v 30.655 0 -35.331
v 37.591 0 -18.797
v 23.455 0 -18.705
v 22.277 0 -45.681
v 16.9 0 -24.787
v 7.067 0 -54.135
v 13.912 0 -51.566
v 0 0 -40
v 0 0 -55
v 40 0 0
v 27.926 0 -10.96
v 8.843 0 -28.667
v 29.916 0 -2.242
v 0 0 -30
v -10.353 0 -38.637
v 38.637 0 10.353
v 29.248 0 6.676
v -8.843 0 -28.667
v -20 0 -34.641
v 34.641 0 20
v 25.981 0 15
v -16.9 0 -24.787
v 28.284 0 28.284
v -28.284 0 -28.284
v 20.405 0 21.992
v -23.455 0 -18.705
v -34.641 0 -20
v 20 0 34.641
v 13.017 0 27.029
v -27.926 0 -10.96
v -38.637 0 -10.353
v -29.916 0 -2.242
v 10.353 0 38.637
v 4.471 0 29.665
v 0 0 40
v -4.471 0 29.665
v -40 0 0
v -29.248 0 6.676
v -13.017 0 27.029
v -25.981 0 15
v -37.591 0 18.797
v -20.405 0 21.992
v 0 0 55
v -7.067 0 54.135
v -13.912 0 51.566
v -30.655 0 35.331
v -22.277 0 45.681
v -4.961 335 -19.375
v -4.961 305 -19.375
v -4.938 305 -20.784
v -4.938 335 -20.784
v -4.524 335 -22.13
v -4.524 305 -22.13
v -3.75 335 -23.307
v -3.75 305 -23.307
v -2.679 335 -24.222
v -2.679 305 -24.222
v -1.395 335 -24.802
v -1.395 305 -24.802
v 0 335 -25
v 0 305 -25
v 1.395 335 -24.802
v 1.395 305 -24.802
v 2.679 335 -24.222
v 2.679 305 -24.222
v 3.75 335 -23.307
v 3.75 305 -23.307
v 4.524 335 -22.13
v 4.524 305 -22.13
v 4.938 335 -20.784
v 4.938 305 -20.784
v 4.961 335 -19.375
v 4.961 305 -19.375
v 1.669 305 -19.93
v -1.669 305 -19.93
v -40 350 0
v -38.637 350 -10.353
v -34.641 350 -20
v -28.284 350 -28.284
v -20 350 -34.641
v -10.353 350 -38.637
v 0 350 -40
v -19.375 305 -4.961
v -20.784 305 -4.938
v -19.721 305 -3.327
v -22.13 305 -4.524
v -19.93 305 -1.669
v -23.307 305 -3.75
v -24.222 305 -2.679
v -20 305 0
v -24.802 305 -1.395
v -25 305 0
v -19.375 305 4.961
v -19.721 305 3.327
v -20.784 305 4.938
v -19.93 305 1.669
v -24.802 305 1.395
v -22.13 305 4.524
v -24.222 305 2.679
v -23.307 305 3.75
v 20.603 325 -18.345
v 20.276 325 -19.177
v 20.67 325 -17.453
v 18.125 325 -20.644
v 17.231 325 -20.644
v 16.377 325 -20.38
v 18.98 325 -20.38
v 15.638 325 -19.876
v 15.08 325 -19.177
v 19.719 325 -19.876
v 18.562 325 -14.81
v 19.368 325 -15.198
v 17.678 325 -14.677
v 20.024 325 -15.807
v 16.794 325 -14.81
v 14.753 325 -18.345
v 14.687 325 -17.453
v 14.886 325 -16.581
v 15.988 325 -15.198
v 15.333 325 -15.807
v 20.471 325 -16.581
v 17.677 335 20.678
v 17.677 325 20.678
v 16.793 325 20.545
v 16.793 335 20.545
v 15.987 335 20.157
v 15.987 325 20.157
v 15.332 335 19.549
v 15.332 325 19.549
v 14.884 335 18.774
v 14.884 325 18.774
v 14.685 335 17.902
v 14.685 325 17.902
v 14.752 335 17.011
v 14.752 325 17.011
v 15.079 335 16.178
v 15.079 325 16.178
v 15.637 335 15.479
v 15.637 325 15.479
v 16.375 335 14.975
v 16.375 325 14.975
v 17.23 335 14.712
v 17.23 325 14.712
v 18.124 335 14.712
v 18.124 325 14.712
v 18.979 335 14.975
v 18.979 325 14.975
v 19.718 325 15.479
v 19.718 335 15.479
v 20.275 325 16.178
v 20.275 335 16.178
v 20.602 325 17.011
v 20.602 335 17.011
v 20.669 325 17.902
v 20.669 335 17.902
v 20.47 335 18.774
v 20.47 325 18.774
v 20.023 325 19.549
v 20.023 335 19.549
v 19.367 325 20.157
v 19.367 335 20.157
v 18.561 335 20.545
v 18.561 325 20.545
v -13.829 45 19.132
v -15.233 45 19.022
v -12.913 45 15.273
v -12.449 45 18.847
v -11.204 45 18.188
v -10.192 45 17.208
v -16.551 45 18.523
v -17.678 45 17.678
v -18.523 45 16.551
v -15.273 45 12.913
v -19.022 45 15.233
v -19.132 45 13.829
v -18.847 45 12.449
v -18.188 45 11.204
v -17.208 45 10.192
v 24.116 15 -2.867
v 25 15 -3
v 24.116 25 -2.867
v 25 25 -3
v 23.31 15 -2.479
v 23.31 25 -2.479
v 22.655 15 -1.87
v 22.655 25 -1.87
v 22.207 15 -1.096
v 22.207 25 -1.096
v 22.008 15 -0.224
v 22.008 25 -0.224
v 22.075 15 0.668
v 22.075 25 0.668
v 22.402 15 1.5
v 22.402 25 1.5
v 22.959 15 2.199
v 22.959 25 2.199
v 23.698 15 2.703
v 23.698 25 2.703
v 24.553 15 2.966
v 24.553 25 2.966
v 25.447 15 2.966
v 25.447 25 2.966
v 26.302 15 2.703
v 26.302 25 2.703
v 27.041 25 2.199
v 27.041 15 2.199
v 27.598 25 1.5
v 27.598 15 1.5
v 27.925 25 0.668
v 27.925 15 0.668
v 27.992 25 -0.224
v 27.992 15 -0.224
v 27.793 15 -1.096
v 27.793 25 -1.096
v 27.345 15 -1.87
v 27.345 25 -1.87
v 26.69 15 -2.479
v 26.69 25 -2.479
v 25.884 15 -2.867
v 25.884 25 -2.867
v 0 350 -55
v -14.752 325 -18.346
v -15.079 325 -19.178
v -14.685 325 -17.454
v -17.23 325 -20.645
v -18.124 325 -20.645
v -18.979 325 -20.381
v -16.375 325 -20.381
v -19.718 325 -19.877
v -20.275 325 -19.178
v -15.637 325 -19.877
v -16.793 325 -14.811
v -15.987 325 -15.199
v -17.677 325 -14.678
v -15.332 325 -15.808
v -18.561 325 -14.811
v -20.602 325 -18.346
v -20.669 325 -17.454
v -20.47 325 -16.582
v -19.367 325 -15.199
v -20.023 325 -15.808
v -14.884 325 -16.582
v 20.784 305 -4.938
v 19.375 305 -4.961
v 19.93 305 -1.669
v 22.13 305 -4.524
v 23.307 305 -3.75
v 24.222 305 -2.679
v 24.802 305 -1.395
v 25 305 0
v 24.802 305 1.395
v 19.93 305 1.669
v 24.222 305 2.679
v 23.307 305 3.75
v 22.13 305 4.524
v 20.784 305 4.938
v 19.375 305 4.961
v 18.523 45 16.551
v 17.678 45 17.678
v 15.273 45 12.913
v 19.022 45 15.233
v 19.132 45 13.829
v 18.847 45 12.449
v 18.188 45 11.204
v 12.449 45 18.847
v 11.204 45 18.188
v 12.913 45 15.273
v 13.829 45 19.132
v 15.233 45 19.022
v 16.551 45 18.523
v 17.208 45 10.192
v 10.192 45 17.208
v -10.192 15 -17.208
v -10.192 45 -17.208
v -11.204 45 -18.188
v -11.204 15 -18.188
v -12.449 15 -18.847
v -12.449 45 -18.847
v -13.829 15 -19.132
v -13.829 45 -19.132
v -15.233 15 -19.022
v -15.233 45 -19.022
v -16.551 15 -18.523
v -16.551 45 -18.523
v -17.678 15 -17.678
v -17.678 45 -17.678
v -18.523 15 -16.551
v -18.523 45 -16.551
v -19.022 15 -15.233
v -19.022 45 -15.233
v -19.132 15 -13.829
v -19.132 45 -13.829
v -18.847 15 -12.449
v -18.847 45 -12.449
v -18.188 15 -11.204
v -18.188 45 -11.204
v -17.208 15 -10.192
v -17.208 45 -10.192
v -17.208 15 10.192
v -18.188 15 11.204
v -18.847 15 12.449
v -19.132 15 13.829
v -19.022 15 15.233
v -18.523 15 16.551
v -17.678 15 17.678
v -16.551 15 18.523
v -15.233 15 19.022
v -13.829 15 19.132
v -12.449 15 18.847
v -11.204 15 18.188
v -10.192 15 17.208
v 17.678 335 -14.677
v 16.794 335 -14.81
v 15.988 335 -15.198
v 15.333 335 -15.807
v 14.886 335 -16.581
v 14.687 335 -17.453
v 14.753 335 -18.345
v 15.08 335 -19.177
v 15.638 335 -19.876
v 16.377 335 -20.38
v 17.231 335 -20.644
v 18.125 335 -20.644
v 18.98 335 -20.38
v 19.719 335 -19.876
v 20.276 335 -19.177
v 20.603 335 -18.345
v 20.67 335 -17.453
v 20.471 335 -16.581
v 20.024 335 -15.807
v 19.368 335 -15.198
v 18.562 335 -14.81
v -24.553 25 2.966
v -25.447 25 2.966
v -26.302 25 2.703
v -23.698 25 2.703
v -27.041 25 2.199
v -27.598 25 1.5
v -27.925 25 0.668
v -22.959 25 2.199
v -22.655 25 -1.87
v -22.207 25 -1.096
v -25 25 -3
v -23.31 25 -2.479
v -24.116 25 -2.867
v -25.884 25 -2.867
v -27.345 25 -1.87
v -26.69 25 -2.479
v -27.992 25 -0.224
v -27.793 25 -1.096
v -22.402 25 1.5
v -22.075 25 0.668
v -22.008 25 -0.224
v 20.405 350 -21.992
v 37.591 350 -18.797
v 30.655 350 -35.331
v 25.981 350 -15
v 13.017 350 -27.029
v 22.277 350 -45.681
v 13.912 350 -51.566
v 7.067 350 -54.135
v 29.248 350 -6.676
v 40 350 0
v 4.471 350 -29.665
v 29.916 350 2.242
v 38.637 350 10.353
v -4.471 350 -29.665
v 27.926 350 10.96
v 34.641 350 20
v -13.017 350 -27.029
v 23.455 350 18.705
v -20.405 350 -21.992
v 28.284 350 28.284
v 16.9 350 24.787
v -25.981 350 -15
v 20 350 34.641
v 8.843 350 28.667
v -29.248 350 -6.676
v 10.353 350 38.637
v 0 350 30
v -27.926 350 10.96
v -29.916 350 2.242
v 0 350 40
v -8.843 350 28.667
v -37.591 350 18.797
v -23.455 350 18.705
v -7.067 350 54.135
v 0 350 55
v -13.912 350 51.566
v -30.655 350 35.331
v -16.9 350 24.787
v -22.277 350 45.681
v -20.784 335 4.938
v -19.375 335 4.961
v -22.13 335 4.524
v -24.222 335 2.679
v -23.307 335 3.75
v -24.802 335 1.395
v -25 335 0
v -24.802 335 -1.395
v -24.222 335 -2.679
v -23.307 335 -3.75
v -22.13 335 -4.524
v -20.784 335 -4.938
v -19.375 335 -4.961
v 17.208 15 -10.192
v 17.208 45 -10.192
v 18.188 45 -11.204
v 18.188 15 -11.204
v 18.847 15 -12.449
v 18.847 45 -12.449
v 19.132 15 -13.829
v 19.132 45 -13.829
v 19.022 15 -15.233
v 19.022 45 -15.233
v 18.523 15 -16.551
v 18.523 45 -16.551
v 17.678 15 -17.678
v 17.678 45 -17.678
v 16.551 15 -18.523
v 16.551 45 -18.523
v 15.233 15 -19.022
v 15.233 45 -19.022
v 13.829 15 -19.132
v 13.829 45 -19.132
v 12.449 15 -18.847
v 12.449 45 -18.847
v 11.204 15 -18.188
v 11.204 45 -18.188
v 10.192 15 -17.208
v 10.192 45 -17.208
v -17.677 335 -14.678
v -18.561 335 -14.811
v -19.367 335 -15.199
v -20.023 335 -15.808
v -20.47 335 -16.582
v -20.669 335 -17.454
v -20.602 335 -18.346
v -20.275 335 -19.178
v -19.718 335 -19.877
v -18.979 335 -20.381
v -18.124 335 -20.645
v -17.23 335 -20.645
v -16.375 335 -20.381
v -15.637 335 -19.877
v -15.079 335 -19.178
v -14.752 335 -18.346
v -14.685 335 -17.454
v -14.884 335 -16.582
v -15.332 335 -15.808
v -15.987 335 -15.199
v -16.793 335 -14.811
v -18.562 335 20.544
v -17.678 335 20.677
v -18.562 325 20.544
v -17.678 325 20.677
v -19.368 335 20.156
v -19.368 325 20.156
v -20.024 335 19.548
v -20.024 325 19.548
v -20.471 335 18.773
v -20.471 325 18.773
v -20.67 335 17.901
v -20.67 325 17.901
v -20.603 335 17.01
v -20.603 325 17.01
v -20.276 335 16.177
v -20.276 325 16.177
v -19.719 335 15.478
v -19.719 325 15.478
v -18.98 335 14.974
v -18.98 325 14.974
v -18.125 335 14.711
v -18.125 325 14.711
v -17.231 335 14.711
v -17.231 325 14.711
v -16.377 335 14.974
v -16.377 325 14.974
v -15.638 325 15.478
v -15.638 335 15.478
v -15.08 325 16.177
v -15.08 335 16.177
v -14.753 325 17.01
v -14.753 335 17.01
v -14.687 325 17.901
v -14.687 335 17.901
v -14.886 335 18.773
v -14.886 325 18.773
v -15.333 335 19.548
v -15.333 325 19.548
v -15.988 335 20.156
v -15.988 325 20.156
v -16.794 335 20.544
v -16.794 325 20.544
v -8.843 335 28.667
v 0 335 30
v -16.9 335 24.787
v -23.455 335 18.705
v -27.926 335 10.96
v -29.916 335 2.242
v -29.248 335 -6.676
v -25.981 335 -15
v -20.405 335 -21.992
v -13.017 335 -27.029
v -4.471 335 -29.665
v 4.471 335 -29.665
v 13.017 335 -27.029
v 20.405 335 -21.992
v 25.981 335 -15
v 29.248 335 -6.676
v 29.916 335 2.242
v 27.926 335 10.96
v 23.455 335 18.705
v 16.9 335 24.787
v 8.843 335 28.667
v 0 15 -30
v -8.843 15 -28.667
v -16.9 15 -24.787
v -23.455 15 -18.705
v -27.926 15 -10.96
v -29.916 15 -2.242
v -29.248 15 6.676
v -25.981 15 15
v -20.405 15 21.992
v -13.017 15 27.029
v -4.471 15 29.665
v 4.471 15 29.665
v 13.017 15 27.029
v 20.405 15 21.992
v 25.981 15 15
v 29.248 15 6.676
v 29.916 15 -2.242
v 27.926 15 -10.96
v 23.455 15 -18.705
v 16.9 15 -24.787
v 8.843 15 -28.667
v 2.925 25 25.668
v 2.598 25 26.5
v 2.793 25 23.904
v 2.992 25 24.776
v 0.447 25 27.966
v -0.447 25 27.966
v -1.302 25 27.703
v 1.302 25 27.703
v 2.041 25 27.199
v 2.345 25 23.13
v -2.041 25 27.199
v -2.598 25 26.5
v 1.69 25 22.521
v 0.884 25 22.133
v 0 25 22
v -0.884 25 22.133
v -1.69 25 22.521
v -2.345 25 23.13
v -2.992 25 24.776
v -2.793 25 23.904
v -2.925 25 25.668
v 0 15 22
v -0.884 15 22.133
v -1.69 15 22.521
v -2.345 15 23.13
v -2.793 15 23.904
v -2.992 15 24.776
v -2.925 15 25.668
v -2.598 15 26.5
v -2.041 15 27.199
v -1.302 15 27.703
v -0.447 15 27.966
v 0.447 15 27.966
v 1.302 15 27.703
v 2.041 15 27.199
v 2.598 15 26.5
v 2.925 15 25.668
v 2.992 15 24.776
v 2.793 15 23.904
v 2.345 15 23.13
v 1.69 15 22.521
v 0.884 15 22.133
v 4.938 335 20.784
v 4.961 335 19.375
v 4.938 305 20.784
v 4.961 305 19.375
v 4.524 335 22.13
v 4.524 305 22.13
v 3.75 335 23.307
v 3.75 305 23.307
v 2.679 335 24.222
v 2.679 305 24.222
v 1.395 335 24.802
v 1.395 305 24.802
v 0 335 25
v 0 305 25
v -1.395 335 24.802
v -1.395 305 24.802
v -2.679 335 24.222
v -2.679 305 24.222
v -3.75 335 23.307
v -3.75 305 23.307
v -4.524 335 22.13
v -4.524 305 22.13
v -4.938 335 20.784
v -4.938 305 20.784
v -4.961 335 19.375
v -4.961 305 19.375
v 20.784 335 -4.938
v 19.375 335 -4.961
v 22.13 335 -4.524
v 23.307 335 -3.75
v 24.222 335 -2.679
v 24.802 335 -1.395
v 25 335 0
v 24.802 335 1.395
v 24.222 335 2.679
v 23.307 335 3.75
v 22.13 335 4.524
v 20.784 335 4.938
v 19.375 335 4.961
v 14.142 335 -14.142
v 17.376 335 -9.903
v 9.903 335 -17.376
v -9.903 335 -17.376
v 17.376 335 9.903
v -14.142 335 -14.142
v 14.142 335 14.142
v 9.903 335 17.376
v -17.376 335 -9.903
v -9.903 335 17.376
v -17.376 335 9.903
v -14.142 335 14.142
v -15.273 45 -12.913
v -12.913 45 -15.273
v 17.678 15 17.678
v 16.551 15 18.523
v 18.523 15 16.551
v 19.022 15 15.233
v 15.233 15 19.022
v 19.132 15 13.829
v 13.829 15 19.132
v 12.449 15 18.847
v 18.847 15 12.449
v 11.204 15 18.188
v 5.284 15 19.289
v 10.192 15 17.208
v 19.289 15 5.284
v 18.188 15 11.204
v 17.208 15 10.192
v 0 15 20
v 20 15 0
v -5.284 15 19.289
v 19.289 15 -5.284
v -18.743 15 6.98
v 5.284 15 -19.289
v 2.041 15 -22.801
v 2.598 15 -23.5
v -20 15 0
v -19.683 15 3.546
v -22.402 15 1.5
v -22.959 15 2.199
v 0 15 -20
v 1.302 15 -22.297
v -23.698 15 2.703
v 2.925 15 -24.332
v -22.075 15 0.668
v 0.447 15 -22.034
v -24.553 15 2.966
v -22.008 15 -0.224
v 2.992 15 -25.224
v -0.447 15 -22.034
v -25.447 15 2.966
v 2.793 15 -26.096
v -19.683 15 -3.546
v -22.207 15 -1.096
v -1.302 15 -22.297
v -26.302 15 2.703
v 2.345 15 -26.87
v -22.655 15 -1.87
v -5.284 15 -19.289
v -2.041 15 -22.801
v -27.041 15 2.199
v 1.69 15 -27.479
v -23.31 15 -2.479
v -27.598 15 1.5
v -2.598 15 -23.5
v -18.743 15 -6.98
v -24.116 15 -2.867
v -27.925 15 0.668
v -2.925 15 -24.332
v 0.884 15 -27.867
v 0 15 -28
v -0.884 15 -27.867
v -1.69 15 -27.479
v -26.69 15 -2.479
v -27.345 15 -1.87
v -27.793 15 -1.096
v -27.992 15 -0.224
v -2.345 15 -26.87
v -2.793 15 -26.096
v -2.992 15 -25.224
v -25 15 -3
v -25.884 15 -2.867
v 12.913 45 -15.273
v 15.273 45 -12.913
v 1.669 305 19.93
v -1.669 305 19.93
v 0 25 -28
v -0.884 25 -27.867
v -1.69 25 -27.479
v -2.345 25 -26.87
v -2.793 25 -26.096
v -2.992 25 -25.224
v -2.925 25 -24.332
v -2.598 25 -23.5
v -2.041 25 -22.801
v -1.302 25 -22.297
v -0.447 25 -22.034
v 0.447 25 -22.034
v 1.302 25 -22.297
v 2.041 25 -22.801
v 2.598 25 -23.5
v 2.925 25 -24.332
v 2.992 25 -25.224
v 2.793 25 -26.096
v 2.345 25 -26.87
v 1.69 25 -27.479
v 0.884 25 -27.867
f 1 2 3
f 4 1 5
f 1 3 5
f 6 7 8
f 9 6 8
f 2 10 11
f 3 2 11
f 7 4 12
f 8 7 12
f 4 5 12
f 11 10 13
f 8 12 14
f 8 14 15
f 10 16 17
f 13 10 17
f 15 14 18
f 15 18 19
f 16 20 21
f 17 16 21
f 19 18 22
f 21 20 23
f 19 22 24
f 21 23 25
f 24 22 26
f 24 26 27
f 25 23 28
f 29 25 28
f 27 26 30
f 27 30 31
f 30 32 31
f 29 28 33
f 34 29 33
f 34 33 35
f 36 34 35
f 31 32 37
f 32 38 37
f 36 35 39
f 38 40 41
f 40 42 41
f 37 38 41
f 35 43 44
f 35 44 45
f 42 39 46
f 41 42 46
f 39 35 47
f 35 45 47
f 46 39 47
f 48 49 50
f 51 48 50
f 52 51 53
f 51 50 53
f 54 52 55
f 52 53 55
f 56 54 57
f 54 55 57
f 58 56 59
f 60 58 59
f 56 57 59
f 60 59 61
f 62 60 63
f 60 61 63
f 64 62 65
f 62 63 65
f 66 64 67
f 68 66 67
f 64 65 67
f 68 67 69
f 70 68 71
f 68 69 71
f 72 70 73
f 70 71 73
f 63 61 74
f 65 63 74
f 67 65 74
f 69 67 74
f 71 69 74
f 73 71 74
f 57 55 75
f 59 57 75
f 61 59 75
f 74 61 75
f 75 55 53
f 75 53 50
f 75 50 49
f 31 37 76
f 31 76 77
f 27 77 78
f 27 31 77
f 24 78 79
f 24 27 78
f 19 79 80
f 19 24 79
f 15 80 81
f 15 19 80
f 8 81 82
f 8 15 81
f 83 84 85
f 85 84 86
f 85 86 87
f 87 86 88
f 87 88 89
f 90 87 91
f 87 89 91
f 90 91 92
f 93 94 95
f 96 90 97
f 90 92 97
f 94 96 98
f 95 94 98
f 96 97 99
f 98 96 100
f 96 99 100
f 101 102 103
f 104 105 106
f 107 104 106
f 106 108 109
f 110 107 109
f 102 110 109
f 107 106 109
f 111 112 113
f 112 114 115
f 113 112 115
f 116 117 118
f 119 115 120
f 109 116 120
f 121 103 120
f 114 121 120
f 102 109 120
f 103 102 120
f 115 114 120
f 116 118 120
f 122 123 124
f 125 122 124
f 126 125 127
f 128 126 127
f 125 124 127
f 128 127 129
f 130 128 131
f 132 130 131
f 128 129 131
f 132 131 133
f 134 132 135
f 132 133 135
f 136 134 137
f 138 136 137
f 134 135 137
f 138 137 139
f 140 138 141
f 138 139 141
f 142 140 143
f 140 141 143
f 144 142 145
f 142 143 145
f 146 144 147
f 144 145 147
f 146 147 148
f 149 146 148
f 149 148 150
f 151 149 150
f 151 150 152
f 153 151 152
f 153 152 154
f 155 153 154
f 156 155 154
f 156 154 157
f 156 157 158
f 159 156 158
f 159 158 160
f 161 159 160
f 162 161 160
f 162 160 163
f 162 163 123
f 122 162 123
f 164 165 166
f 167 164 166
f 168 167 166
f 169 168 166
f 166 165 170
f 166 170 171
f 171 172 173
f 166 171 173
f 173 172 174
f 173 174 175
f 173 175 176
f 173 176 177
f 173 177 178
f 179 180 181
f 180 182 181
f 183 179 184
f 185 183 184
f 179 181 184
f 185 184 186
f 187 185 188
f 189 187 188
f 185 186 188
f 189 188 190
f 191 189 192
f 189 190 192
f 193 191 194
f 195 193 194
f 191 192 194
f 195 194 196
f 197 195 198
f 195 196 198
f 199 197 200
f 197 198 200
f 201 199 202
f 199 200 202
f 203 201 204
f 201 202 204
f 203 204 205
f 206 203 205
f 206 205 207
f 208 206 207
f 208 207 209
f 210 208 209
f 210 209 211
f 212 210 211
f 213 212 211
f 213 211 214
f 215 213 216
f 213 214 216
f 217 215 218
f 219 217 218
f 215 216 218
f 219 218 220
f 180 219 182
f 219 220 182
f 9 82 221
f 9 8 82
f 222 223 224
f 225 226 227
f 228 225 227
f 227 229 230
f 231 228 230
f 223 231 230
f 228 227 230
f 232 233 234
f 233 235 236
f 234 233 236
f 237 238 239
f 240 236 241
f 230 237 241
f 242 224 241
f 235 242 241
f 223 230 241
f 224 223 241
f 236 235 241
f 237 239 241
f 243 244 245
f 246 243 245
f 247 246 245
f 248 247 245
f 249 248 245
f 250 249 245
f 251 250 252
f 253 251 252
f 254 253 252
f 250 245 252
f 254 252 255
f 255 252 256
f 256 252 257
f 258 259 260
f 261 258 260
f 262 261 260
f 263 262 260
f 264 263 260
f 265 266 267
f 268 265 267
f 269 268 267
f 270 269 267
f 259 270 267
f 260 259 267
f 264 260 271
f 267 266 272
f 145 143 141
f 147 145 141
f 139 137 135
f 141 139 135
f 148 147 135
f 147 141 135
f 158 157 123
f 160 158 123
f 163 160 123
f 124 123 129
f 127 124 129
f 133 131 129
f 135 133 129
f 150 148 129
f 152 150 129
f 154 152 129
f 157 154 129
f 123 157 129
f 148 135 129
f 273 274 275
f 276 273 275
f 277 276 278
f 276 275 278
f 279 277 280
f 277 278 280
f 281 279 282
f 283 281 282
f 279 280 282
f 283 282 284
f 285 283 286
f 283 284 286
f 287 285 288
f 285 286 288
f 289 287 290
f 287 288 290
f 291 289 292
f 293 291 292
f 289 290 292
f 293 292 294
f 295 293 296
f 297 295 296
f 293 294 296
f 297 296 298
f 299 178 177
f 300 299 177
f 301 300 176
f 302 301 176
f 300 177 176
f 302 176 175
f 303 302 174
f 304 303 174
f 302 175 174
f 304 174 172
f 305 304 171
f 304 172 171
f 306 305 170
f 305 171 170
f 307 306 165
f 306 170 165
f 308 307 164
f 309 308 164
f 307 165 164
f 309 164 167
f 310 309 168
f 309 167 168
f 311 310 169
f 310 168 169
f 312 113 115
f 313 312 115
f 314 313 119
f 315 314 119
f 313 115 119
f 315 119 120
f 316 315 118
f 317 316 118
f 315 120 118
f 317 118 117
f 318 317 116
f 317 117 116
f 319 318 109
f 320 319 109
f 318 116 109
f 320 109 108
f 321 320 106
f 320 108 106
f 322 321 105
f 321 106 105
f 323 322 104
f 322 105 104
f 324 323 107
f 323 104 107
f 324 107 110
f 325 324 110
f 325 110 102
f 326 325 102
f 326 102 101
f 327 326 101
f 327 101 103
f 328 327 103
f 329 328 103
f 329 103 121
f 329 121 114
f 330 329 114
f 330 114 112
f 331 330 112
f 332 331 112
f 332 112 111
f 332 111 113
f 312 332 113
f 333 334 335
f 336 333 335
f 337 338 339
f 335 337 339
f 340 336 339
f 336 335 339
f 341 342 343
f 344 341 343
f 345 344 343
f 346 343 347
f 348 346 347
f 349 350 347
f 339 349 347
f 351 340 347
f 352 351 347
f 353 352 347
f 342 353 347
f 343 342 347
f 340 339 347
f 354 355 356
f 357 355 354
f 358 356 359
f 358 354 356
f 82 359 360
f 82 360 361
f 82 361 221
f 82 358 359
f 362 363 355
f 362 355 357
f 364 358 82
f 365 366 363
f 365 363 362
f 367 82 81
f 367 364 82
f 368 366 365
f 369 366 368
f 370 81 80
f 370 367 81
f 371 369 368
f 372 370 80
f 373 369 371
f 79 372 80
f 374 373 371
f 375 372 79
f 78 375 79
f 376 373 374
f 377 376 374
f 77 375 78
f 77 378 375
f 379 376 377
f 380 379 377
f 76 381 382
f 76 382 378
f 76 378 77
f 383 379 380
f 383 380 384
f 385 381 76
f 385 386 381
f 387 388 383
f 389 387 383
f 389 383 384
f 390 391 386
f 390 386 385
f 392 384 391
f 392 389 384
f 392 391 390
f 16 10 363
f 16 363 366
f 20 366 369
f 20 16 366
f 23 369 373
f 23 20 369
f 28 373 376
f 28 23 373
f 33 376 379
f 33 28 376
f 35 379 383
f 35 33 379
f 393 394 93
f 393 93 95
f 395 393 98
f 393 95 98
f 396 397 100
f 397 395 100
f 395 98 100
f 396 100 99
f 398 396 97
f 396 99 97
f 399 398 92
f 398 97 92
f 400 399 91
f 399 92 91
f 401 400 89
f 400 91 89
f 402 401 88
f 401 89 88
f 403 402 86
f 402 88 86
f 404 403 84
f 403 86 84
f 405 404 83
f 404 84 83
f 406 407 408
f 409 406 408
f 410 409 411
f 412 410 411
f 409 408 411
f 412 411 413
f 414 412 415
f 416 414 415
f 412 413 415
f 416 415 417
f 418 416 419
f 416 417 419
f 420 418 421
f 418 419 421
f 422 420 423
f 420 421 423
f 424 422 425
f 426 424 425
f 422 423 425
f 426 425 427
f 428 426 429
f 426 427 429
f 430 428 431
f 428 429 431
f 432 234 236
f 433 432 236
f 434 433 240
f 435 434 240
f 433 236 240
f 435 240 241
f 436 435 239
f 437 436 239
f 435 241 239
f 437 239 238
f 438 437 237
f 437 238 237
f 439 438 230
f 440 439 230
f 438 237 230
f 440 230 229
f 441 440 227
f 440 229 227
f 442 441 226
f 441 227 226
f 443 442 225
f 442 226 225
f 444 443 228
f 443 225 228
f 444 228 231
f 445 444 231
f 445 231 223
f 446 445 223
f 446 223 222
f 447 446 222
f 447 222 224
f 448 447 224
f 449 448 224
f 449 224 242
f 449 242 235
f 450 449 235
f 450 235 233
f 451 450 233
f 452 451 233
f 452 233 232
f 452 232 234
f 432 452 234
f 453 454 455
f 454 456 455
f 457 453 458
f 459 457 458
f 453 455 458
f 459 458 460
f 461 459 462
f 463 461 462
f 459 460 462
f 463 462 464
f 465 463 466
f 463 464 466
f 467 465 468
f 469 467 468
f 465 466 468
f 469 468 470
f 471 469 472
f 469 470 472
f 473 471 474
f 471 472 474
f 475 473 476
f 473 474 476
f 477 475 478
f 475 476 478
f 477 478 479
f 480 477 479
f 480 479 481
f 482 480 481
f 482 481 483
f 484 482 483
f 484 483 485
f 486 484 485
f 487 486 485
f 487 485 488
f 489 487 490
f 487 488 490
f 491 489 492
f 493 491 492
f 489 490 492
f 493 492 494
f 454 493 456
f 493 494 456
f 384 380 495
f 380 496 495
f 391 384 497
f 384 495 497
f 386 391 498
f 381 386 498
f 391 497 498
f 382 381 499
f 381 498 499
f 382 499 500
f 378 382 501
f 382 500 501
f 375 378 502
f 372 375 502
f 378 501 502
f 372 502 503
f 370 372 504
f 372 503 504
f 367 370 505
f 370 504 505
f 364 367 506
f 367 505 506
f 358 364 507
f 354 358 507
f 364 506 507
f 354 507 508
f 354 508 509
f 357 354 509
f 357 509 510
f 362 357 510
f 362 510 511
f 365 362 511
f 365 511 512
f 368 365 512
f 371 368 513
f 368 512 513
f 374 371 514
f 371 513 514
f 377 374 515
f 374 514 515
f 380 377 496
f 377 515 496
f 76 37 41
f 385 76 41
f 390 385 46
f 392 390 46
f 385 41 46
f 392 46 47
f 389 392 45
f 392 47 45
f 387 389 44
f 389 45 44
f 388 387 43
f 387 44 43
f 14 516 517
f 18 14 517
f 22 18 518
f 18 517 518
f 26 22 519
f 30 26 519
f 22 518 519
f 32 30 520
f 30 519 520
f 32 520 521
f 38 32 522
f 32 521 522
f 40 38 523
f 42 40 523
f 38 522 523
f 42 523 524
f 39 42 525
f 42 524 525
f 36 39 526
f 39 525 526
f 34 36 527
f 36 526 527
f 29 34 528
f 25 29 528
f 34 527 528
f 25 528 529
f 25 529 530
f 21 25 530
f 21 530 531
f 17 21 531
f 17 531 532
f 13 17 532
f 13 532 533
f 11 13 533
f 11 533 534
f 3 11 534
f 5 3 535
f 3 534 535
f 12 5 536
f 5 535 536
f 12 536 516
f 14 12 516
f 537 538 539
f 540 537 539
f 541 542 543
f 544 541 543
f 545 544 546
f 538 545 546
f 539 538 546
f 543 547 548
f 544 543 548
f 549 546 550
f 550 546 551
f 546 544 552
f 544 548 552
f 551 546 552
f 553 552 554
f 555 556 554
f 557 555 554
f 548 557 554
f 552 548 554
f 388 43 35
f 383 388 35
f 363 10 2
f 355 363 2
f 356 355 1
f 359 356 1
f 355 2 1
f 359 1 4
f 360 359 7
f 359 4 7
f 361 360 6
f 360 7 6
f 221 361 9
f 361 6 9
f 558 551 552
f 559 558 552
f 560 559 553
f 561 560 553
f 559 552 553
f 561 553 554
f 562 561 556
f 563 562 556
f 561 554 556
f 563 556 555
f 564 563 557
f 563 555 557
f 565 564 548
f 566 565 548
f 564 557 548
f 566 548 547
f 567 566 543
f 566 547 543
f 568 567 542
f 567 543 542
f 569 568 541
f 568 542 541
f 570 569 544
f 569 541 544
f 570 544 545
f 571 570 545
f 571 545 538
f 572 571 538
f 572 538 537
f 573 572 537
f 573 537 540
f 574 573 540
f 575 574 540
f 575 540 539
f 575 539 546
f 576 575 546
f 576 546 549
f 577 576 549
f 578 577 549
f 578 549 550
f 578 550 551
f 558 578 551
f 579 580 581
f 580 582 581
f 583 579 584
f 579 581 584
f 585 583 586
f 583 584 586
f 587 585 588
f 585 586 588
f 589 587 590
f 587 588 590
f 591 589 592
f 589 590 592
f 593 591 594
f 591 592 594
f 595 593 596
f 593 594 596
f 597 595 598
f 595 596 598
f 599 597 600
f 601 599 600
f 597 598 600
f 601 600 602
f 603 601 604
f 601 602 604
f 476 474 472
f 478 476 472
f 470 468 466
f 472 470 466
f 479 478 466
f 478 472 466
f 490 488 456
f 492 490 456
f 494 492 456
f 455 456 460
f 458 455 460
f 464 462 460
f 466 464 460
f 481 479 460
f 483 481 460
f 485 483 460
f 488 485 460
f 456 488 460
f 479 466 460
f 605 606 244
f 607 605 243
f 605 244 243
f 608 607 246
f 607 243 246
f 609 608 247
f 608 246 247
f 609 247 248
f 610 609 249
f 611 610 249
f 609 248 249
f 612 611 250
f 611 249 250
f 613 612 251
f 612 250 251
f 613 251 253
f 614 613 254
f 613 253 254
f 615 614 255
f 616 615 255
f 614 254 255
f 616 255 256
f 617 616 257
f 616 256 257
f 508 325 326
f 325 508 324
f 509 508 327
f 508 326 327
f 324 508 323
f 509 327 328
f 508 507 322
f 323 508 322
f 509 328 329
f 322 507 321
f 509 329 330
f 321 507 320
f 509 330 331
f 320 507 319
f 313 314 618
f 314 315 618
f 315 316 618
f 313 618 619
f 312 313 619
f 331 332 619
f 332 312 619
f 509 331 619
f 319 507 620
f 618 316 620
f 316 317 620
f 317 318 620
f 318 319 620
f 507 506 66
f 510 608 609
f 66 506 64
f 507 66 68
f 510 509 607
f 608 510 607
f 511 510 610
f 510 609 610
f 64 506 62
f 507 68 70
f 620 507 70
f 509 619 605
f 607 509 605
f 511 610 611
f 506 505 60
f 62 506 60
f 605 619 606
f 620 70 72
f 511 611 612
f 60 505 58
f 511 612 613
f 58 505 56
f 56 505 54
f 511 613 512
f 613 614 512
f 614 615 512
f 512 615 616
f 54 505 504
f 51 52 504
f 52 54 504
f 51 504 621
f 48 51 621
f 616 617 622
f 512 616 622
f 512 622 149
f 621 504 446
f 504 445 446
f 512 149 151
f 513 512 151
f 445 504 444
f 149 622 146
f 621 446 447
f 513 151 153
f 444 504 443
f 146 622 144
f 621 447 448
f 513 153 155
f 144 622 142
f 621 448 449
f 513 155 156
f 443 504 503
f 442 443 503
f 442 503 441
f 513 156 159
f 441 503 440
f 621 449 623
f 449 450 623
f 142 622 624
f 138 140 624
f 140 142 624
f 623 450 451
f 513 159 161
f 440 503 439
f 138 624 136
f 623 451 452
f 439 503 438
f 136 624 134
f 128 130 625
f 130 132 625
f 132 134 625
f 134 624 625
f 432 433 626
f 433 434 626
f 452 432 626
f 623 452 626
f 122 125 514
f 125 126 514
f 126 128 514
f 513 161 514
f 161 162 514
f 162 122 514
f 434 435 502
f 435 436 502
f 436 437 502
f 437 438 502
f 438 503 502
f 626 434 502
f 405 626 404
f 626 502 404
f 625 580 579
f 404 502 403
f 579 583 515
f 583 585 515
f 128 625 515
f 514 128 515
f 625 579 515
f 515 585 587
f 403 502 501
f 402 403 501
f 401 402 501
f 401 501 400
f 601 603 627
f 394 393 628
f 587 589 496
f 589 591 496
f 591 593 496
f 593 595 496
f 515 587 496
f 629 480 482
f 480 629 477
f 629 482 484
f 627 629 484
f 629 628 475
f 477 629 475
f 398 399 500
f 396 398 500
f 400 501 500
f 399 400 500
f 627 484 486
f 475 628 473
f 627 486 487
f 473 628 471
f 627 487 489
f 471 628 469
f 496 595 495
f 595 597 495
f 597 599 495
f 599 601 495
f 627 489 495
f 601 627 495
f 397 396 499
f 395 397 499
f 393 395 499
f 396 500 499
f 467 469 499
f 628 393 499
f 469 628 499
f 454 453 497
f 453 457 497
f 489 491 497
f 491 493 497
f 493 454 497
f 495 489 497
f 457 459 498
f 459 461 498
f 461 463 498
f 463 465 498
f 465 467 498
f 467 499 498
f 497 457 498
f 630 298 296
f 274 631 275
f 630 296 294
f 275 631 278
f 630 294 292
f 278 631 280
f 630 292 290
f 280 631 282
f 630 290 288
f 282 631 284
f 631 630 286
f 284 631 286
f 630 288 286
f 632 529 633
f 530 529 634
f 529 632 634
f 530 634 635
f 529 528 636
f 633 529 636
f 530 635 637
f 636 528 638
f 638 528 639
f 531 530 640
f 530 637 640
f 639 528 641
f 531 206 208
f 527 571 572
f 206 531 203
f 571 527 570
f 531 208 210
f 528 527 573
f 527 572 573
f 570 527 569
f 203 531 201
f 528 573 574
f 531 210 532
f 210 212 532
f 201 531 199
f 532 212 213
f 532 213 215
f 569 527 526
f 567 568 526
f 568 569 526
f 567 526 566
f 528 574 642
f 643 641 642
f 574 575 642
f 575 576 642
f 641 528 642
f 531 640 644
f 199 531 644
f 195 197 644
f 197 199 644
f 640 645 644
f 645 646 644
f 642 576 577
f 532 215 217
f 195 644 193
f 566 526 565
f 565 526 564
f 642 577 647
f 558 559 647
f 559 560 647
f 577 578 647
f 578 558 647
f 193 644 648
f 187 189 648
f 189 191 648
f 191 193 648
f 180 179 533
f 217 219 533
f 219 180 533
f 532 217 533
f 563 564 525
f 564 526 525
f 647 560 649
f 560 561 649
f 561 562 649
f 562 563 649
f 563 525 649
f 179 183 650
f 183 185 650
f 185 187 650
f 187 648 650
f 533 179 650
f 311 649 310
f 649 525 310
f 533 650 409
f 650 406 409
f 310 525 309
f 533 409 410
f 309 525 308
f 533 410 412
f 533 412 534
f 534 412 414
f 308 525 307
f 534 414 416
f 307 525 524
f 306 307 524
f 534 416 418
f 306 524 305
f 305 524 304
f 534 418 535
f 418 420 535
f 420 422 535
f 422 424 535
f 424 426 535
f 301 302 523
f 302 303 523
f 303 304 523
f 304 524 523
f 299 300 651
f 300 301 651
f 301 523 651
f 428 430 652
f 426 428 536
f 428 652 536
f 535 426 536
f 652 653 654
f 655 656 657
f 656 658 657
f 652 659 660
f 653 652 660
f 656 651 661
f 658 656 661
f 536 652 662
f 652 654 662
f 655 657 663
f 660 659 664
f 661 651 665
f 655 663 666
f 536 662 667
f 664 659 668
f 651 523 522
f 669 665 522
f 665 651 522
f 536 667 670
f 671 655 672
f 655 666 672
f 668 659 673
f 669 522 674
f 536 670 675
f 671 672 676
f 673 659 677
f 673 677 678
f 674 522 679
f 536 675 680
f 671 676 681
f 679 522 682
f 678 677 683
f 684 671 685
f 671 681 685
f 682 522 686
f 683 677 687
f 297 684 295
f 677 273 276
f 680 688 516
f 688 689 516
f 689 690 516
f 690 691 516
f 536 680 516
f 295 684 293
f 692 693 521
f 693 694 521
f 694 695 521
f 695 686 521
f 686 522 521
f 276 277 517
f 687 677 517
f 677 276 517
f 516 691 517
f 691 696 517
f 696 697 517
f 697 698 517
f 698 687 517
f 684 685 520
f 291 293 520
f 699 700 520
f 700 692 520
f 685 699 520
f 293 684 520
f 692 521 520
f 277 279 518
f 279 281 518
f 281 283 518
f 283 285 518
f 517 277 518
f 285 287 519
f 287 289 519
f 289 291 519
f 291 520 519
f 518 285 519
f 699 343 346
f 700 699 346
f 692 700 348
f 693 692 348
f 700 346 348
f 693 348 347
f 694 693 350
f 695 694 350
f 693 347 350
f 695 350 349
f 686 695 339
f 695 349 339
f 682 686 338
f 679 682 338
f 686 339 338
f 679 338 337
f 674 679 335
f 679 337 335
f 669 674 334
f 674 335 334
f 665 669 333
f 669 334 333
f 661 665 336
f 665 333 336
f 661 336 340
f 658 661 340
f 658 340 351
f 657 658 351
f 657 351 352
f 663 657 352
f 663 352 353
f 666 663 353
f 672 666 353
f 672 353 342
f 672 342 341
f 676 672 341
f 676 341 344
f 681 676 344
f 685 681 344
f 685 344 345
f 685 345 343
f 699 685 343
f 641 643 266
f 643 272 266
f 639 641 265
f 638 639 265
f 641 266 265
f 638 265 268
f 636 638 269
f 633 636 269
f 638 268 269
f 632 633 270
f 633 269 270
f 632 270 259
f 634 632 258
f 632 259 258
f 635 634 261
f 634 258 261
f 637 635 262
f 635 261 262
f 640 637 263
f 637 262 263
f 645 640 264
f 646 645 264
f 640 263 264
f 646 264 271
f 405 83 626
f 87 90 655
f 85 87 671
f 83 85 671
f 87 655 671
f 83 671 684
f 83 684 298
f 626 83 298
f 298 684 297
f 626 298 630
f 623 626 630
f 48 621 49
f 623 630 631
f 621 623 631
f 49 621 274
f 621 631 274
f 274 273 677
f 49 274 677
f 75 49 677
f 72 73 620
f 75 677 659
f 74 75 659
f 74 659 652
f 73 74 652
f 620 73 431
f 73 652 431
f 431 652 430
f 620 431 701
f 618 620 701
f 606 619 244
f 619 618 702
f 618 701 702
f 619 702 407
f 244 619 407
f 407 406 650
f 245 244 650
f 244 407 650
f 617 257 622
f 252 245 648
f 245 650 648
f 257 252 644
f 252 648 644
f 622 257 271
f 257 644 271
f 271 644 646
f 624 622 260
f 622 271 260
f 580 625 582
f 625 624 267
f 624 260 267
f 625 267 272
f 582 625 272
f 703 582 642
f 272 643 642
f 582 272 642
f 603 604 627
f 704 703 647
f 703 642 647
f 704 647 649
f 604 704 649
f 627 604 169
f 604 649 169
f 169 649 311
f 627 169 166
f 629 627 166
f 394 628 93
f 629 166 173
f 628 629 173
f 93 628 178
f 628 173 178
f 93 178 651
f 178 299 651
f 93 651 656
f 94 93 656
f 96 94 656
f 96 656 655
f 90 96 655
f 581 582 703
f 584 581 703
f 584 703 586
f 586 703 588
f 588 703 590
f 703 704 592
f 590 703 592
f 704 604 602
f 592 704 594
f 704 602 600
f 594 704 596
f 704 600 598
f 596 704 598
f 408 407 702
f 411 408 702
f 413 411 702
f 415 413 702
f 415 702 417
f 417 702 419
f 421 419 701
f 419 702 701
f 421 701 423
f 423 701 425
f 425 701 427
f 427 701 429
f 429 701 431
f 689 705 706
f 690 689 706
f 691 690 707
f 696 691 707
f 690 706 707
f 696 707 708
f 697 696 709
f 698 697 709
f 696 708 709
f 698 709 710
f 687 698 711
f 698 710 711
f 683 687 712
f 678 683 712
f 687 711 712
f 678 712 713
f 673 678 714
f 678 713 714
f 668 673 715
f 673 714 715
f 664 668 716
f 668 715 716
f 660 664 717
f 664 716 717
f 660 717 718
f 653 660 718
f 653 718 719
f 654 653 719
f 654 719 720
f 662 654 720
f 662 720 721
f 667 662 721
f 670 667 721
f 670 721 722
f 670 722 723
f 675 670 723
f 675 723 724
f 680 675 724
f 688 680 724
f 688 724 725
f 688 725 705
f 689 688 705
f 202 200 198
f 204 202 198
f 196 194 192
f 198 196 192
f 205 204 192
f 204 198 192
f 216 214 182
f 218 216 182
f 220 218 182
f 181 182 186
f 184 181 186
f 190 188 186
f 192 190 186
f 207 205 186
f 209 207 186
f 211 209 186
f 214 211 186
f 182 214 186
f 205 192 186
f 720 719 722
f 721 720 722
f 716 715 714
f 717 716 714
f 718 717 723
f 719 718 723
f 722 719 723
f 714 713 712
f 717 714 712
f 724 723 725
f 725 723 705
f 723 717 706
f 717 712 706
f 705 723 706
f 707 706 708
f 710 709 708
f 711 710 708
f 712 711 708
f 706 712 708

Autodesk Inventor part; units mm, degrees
ref_plane "YZ Plane" through (0, 0, 0) normal (1, 0, 0) x (0, 1, 0)
ref_plane "XZ Plane" through (0, 0, 0) normal (0, 1, 0) x (-1, 0, 0)
ref_plane "XY Plane" through (0, 0, 0) normal (0, 0, 1) x (1, 0, 0)
sketch "Эскиз1" plane through (0, 0, 0) normal (0, 1, 0) x (-1, 0, 0)
  circle A0 centre (0, 0) radius 20
  ellipse E0 centre (0, 0) end of major axis (0, -55) minor radius 40 (40, 0) -> (0, 55) ccw
  ellipse E1 centre (0, 0) end of major axis (0, -55) minor radius 40 (-40, 0) -> (0, -55) ccw
  arc A1 (0, -40) -> (40, 0) centre (0, 0) ccw
  arc A2 (0, 40) -> (-40, 0) centre (0, 0) ccw
  line L0 (0, 55) -> (0, 40)
  line L1 (0, -40) -> (0, -55)
  line L2 (0, -40) -> (0, -55)
  line L3 (0, 40) -> (0, 55)
  dimension "d0" = 40
  dimension "d2" = 55
  dimension "d3" = 55
extrude "Выдавливание1" add sketch "Эскиз1" along normal blind 350
sketch "Эскиз2" plane through (0, 350, 0) normal (0, 1, 0) x (1, 0, 0)
  point P0 (0, 0)
hole "Отверстие1" at (0, 350, 0) direction (0, -1, 0) diameter 60 depth 15
sketch "Эскиз3" plane through (0, 350, 0) normal (0, 1, 0) x (1, 0, 0)
  line L0 (0, 0) -> (-20, 0)
  circle A0 centre (0, 0) radius 20 projected
  line L1 (0, 0) -> (0, 20)
  line L2 (0, 0) -> (0, -20)
  line L3 (0, 0) -> (20, 0)
hole "Отверстие2" at (-20, 350, 0) at (0, 350, -20) at (20, 350, 0) at (0, 350, 20) direction (0, -1, 0) diameter 10 depth 45
sketch "Эскиз4" plane through (0, 0, 0) normal (0, -1, 0) x (1, 0, 0)
  circle A0 centre (0, 0) radius 30
hole "Отверстие3" at (0, 0, 0) direction (0, 1, 0) diameter 60 depth 15
sketch "Эскиз5" plane through (0, 0, 0) normal (0, -1, 0) x (1, 0, 0)
  line L0 (0, 0) -> (-14.1421, -14.1421)
  line L1 (0, 0) -> (20, 0) construction
  line L2 (0, 0) -> (-14.1421, 14.1421)
  arc A0 (-4.9608, 19.375) -> (-19.375, 4.9608) centre (0, 0) ccw projected
  line L3 (0, 0) -> (14.1421, 14.1421)
  line L4 (0, 0) -> (14.1421, -14.1421)
  dimension "d27" = 20
  dimension "d28" = 135
hole "Отверстие4" at (14.1421, 0, -14.1421) at (-14.1421, 0, 14.1421) at (14.1421, 0, 14.1421) at (-14.1421, 0, -14.1421) direction (0, 1, 0) diameter 10 depth 45
sketch "Эскиз6" plane through (0, 0, 0) normal (0, -1, 0) x (1, 0, 0)
  line L0 (0, 0) -> (0, 25)
  arc A0 (4.9608, 19.375) -> (-4.9608, 19.375) centre (0, 20) ccw projected
  line L1 (0, 0) -> (-25, 0)
  arc A1 (-19.375, 4.9608) -> (-19.375, -4.9608) centre (-20, 0) ccw projected
  line L2 (0, 0) -> (0, -25)
  arc A2 (-4.9608, -19.375) -> (4.9608, -19.375) centre (0, -20) ccw projected
  line L3 (0, 0) -> (25, 0)
  arc A3 (19.375, -4.9608) -> (19.375, 4.9608) centre (20, 0) ccw projected
hole "Отверстие5" at (0, 0, -25) at (-25, 0, 0) at (0, 0, 25) at (25, 0, 0) direction (0, 1, 0) diameter 6 depth 25
sketch "Эскиз7" plane through (0, 350, 0) normal (0, 1, 0) x (1, 0, 0)
  line L0 (0, 0) -> (-17.6771, 17.6782)
  arc A0 (-10.1924, 17.208) -> (-17.208, 10.1924) centre (-14.1421, 14.1421) ccw projected
  line L1 (0, 0) -> (-17.6782, -17.6771)
  arc A1 (-17.208, -10.1924) -> (-10.1924, -17.208) centre (-14.1421, -14.1421) ccw projected
  line L2 (0, 0) -> (17.6771, -17.6782)
  arc A2 (10.1924, -17.208) -> (17.208, -10.1924) centre (14.1421, -14.1421) ccw projected
  line L3 (0, 0) -> (17.6782, 17.6771)
  arc A3 (17.208, 10.1924) -> (10.1924, 17.208) centre (14.1421, 14.1421) ccw projected
hole "Отверстие6" at (-17.6782, 350, 17.6771) at (-17.6771, 350, -17.6782) at (17.6782, 350, -17.6771) at (17.6771, 350, 17.6782) direction (0, -1, 0) diameter 6 depth 25
properties part number "Барабан" material "Сталь, литейная"
